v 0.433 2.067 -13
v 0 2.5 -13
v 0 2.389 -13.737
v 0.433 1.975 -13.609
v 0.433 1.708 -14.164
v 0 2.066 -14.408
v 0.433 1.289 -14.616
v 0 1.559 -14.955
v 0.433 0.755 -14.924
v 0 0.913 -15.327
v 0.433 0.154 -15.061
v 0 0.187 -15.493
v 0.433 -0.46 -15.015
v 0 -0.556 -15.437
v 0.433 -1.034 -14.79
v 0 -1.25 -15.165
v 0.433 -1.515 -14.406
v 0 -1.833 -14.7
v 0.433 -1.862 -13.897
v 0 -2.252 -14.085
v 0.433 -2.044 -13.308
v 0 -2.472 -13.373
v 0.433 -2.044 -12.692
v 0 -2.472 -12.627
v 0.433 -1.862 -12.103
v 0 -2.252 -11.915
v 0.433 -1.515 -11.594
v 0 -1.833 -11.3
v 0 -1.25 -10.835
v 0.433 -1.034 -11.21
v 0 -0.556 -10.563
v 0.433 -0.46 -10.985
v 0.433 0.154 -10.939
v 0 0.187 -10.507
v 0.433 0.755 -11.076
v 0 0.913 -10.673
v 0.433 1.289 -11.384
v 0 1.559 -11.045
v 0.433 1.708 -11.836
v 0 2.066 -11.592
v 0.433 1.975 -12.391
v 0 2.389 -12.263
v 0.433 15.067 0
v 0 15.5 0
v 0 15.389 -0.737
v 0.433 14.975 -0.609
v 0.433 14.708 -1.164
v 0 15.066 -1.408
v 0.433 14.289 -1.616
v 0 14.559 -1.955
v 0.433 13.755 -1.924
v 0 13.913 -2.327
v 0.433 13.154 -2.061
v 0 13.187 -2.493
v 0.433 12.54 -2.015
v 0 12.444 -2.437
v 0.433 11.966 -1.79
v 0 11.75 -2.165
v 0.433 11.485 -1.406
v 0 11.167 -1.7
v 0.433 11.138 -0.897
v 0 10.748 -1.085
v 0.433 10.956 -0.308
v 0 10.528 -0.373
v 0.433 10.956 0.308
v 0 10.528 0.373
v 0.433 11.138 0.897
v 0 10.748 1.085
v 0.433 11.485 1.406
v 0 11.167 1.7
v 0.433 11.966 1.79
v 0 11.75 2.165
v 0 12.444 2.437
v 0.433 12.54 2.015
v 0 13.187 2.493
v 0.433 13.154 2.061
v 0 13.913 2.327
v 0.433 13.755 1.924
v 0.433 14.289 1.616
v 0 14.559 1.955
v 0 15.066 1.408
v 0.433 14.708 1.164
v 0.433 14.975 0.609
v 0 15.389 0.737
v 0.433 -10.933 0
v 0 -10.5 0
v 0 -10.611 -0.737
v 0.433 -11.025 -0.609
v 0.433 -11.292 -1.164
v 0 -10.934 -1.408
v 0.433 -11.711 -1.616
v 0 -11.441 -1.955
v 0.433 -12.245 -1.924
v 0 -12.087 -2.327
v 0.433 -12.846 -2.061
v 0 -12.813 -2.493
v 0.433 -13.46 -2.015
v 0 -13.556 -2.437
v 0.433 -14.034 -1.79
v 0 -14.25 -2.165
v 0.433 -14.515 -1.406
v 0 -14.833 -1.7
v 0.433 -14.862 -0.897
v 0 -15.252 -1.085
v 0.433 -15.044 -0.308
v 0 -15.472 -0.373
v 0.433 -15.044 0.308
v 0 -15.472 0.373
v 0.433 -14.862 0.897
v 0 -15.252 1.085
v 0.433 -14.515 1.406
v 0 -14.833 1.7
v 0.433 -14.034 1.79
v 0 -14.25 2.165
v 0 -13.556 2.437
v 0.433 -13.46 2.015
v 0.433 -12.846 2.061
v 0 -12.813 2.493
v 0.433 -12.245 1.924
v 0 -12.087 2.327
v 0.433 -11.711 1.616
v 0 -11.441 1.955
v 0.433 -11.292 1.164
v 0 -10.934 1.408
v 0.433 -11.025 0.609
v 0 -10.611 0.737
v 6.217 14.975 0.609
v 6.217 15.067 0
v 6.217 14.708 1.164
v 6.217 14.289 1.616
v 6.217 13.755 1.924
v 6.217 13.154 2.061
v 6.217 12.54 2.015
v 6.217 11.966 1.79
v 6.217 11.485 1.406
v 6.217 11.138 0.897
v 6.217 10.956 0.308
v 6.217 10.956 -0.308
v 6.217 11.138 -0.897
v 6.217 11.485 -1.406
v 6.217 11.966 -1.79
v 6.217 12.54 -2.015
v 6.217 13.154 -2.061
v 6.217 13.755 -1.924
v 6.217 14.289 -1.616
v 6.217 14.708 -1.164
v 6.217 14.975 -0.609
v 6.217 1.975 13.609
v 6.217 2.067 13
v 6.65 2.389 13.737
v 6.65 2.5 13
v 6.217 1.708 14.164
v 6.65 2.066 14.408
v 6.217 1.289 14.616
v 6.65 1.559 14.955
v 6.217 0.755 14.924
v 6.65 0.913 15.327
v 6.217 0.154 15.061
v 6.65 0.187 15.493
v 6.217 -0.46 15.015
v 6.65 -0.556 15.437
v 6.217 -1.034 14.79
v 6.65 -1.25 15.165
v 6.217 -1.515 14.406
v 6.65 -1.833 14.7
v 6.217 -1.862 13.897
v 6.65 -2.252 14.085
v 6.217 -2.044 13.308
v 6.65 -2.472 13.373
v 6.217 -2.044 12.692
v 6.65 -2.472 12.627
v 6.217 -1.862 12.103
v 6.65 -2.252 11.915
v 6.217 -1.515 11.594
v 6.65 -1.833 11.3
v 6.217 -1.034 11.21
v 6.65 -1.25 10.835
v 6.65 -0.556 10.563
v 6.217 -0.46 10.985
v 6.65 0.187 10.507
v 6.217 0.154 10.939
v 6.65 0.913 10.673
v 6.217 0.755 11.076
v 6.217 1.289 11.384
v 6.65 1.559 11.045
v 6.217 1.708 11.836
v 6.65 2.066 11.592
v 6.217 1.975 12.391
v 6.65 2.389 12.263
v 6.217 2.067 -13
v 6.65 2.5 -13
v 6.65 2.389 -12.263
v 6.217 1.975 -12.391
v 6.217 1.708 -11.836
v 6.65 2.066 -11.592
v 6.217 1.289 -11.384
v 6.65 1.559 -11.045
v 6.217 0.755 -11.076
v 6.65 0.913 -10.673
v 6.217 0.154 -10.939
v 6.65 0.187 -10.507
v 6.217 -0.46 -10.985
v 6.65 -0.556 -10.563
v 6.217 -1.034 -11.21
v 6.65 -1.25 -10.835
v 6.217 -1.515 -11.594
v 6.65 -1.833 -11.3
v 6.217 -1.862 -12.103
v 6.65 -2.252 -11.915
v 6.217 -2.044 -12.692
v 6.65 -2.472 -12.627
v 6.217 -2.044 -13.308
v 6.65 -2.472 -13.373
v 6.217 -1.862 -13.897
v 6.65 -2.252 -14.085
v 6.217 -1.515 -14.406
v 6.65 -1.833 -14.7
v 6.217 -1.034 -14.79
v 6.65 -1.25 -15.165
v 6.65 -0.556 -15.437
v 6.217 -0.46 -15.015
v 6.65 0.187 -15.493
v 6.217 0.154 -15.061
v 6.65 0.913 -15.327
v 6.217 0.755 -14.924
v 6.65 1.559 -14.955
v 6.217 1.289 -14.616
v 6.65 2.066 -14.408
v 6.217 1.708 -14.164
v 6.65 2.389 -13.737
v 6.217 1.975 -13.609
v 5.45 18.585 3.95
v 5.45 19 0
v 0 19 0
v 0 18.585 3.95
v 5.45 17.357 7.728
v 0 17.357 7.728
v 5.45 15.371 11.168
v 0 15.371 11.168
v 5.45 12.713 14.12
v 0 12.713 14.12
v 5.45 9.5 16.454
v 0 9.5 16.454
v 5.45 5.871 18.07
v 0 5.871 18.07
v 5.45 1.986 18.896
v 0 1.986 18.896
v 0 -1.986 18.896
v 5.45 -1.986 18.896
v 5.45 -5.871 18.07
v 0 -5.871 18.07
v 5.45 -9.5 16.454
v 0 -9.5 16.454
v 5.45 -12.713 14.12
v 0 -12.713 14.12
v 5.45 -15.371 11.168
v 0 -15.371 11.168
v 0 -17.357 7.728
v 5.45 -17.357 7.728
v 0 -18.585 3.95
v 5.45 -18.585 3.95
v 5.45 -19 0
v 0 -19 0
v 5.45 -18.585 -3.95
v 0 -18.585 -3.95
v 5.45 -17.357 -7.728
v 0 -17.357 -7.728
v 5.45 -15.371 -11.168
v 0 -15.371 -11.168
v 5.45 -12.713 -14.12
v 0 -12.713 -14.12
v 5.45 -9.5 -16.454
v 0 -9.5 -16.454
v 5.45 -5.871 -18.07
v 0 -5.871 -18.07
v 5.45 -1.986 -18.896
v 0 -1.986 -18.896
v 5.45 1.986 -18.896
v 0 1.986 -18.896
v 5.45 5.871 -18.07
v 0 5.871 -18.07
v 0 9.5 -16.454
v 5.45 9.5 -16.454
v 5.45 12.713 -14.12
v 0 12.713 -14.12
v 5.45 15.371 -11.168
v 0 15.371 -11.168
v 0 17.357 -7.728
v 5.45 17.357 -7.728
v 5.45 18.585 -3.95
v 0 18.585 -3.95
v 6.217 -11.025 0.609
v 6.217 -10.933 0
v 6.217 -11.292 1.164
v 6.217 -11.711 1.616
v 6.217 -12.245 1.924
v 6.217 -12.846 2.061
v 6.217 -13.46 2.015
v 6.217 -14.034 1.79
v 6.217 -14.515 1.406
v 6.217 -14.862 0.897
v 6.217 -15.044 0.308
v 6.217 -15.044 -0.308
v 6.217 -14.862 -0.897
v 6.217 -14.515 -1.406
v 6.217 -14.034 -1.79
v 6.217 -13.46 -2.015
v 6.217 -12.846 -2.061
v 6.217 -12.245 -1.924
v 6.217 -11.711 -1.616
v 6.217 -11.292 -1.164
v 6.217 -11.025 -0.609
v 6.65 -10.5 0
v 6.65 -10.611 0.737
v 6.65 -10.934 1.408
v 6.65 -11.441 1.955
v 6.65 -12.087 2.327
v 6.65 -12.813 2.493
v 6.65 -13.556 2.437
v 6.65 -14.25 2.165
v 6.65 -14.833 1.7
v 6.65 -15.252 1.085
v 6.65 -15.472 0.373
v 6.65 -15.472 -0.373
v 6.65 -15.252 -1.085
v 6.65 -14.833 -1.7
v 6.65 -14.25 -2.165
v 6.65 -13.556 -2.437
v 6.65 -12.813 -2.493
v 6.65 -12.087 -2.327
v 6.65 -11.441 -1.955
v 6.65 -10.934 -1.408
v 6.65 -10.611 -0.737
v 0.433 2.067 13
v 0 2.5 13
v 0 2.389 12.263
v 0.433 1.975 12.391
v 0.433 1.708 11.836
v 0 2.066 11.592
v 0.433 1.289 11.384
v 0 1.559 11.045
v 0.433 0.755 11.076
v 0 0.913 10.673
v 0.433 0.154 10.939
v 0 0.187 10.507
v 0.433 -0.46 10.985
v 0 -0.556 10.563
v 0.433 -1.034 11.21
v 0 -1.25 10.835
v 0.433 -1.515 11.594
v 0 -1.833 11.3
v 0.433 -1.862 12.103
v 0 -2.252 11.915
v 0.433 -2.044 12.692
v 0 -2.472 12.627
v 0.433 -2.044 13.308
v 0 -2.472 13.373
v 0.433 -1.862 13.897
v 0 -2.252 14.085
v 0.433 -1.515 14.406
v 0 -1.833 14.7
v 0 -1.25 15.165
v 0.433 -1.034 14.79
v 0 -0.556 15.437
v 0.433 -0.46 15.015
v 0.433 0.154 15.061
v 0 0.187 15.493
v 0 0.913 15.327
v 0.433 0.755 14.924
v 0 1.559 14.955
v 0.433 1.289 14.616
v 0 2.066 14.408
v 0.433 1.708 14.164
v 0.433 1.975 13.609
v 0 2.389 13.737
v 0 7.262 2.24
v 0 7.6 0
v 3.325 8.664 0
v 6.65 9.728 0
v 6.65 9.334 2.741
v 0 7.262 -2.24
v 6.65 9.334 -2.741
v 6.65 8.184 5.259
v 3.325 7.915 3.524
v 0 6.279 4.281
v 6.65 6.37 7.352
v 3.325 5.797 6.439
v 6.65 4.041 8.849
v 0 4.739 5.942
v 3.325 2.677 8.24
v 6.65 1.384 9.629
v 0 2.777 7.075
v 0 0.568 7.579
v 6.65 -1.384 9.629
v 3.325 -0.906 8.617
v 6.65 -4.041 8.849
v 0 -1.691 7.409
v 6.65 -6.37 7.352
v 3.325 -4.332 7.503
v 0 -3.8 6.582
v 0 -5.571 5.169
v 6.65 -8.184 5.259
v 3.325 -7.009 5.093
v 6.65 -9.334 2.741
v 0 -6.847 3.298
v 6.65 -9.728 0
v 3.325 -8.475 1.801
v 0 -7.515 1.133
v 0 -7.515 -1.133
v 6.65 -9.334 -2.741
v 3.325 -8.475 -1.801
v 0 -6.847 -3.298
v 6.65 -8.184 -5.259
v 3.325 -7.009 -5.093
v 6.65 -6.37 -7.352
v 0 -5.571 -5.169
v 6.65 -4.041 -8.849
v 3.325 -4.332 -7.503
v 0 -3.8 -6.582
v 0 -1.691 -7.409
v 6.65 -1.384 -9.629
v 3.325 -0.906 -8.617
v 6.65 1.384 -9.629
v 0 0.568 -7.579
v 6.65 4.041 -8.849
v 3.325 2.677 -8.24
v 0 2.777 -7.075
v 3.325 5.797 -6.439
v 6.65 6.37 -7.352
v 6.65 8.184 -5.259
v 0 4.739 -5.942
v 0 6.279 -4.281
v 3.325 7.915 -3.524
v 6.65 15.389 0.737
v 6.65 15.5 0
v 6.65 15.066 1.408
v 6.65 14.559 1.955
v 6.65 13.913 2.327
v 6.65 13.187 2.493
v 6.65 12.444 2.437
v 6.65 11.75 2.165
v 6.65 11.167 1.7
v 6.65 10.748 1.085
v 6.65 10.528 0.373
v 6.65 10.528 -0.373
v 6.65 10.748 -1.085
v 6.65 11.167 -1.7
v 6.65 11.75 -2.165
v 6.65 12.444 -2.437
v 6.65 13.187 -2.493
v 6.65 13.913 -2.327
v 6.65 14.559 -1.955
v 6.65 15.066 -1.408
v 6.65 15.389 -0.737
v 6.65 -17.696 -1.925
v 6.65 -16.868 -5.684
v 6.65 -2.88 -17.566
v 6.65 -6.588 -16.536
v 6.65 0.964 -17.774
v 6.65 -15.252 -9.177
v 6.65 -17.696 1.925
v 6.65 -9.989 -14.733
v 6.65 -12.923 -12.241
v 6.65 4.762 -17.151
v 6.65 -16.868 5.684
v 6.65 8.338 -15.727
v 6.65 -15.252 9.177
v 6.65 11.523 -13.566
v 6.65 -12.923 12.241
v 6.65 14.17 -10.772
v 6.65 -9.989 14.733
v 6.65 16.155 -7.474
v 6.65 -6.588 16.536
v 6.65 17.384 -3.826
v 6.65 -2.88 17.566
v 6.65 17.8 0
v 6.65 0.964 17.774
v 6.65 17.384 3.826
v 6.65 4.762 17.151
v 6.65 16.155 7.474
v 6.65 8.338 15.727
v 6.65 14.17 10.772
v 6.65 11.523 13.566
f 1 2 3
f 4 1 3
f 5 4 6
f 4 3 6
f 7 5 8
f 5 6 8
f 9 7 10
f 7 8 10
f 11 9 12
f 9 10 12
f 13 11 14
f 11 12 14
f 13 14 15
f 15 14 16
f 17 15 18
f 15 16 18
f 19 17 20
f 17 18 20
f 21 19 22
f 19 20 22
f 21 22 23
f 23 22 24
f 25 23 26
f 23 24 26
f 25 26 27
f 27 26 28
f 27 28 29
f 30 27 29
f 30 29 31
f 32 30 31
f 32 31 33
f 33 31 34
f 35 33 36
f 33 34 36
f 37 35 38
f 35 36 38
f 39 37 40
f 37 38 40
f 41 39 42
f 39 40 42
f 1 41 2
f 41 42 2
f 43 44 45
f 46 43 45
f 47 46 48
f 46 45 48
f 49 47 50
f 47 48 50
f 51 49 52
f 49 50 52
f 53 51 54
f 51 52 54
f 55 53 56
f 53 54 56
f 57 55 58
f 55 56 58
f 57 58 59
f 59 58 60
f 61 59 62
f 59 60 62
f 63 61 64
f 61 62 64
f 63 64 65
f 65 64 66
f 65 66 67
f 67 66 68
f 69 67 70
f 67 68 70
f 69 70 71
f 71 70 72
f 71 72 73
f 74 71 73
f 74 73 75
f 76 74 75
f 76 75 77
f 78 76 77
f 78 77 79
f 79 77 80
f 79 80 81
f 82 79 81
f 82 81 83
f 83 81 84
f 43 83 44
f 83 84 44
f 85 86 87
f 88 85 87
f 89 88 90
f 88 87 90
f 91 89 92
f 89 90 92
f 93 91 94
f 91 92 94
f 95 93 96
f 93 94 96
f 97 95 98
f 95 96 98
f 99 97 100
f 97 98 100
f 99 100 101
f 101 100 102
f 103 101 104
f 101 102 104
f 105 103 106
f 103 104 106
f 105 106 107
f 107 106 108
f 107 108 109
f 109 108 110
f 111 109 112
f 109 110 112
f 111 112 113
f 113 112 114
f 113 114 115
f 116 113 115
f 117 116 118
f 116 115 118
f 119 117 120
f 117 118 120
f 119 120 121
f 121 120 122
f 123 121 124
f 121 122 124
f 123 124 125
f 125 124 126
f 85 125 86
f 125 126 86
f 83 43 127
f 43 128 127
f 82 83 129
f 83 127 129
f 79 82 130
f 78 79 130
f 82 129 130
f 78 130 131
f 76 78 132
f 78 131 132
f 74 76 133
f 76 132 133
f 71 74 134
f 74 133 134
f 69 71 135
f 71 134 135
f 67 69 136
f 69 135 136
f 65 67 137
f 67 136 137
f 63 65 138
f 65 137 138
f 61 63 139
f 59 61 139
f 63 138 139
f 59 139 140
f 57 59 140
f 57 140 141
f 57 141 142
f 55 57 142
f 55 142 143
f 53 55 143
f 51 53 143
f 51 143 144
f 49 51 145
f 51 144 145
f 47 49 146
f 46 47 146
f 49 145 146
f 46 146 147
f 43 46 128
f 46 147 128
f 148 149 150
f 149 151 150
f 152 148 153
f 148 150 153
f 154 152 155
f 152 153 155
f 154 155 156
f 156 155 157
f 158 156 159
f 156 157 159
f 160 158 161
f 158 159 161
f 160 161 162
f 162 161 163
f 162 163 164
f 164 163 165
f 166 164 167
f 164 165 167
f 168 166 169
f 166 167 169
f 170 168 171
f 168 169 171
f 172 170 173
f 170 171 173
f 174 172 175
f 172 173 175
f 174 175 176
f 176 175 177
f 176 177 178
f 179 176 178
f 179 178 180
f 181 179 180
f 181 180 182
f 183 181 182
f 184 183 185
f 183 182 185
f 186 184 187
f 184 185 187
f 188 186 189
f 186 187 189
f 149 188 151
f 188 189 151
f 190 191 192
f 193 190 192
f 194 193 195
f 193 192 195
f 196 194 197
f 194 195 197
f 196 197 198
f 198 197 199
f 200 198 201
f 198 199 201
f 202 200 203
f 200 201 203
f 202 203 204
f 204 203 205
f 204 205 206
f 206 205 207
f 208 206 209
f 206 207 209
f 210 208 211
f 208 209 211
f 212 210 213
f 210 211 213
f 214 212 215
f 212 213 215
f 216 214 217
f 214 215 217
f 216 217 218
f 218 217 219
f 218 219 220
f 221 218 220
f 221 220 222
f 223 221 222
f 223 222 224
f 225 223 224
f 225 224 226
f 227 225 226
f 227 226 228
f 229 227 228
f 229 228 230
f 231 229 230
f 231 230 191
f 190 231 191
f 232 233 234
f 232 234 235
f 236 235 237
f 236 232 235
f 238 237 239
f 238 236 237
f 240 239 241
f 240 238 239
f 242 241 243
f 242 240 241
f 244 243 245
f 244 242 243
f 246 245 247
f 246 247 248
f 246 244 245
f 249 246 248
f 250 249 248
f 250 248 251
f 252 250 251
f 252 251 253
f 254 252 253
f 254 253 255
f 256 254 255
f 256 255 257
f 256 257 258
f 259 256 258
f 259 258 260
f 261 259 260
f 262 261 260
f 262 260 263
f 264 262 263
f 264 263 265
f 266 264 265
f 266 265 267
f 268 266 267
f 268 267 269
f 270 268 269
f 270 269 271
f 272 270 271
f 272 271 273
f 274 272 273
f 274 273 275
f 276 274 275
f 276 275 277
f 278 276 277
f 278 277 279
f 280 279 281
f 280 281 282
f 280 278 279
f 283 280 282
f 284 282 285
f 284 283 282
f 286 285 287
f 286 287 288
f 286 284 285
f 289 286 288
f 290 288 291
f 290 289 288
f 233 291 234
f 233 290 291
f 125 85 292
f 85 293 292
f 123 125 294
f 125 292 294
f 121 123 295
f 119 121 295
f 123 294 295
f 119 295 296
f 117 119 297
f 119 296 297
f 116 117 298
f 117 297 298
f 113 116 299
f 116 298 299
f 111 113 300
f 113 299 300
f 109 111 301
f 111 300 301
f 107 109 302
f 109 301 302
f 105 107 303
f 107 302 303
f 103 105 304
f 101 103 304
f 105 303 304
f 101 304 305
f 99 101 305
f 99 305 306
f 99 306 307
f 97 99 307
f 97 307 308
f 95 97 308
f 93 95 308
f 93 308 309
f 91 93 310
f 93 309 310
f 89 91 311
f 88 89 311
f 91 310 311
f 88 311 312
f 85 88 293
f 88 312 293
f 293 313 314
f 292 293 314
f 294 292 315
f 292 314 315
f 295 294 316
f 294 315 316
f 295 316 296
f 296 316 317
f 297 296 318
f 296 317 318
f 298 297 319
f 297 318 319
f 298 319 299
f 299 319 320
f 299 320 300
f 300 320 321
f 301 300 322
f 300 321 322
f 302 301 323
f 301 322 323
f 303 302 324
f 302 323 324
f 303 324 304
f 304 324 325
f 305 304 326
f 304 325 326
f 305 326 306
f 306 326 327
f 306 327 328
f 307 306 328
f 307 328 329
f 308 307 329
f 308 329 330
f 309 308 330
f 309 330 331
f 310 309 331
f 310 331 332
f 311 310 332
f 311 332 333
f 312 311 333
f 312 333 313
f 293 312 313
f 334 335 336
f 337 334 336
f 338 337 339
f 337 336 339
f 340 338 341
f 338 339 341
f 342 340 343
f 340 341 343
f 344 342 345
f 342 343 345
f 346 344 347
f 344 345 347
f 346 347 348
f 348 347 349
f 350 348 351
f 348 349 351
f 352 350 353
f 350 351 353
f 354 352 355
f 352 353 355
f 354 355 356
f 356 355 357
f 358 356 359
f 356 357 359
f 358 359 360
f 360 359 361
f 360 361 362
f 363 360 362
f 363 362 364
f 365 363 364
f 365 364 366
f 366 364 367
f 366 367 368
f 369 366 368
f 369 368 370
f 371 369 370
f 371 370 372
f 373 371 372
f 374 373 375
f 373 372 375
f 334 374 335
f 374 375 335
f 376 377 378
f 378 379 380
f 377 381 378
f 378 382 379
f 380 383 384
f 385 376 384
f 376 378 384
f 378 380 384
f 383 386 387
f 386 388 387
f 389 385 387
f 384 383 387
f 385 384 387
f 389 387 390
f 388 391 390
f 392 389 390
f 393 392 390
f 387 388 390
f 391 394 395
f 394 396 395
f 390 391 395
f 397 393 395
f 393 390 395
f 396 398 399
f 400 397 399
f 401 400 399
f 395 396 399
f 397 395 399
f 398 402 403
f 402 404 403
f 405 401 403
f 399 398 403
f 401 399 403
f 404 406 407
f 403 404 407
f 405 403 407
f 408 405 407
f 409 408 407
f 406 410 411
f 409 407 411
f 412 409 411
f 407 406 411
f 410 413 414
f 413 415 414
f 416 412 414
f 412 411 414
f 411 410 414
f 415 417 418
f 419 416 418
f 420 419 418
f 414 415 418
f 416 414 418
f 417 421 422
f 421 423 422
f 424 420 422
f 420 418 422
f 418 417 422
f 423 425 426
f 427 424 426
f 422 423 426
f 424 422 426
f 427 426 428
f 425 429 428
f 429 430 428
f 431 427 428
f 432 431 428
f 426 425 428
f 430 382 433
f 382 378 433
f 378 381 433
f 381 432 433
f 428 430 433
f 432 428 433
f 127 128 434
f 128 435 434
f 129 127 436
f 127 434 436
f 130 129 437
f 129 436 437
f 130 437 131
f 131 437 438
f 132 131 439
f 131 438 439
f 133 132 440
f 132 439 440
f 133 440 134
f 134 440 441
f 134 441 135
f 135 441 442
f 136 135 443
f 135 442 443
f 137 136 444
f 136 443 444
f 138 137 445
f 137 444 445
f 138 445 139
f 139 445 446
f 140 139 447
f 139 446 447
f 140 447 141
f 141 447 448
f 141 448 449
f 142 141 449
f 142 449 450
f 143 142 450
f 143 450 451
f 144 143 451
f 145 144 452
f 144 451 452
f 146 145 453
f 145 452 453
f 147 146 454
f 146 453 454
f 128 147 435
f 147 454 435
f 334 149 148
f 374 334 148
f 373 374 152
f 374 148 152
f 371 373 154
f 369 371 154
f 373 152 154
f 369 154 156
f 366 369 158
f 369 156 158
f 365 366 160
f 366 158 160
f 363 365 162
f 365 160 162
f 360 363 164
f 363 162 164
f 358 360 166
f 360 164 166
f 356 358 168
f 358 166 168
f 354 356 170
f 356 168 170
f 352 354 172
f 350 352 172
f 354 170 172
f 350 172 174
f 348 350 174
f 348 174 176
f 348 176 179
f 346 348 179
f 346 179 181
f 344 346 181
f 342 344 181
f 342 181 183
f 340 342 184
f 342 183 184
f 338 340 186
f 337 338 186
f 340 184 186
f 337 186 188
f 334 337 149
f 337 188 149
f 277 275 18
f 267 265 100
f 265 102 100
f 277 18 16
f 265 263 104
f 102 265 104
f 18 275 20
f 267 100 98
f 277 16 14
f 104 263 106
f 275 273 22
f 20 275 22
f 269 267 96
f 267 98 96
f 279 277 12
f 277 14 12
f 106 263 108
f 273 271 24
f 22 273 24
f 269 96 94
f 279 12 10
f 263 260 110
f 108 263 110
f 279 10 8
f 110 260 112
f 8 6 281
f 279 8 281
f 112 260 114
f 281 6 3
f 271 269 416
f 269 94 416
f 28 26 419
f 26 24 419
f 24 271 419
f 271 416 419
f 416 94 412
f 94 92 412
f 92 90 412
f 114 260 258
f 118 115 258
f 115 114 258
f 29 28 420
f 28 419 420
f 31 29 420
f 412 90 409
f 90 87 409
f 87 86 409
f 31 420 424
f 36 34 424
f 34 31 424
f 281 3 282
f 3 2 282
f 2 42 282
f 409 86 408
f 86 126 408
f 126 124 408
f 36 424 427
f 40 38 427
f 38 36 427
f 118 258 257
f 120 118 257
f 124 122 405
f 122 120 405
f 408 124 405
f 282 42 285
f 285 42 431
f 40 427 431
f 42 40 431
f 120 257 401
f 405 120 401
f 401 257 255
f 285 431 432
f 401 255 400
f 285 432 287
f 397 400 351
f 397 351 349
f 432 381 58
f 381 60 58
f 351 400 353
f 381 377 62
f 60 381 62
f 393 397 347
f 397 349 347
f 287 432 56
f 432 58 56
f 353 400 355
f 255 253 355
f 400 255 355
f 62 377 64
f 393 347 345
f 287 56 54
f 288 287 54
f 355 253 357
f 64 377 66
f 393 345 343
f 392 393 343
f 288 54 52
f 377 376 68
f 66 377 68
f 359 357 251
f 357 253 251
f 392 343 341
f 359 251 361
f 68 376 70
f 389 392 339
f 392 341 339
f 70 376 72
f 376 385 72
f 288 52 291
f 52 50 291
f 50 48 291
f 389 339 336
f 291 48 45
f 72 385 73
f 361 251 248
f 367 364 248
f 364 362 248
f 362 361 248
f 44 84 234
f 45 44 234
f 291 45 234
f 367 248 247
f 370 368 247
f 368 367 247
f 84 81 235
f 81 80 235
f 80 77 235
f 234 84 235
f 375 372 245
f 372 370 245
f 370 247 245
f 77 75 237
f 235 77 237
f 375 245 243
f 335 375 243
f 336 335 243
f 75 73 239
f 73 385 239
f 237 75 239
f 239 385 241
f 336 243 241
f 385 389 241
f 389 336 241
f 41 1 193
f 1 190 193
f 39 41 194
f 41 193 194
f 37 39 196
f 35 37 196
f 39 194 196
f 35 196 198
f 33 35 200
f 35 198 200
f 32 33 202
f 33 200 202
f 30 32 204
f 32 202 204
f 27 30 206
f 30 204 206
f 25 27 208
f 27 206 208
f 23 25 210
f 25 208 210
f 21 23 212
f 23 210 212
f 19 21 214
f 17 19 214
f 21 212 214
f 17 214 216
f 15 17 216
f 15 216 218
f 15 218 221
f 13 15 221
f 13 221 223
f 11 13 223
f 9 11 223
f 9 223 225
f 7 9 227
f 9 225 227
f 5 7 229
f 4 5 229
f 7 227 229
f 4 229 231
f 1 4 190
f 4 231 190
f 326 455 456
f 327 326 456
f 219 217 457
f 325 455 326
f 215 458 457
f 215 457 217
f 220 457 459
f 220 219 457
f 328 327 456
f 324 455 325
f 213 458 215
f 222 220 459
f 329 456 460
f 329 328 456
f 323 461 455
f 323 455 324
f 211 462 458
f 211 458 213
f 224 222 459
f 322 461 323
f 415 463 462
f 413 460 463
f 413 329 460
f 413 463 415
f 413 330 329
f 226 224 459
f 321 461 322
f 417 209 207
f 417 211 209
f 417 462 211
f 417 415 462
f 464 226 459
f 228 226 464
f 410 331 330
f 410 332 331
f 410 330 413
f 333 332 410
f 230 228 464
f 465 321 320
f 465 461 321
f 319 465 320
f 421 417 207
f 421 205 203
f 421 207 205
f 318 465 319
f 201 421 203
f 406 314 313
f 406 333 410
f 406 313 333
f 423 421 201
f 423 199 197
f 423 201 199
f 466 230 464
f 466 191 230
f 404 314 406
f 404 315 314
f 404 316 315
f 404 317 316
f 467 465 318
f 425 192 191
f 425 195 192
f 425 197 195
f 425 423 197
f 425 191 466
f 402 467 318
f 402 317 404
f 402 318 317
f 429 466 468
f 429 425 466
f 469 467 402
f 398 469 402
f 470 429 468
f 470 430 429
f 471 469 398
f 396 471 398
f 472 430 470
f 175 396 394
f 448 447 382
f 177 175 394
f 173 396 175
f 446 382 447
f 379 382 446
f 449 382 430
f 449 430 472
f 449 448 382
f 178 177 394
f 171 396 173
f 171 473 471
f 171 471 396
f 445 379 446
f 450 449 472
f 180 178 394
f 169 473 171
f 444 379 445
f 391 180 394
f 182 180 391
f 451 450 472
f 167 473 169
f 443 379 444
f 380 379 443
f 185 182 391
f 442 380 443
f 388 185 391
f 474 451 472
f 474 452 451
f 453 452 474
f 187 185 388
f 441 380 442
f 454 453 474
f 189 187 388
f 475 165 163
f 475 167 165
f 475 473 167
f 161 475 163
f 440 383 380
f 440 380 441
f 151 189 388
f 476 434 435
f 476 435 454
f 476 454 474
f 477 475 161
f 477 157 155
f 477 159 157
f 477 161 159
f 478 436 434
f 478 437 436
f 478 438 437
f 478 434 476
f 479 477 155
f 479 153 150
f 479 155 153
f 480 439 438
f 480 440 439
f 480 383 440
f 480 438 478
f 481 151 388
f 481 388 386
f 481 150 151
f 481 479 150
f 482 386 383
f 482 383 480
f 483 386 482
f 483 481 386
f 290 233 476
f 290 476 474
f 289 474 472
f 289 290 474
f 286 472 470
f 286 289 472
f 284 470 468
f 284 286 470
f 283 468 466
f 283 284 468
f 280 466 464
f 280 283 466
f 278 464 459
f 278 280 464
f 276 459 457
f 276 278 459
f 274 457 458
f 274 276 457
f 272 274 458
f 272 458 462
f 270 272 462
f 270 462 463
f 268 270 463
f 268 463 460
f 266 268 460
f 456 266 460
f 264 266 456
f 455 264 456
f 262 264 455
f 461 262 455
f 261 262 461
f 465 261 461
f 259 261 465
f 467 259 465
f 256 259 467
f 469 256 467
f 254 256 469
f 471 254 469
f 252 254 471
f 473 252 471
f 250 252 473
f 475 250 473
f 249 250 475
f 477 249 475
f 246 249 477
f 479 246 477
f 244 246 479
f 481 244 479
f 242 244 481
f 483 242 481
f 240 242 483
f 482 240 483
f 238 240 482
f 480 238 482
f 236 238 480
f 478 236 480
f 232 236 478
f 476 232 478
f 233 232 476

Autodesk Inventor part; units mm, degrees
sketch "Sketch_10" plane through (0, 0, 0) normal (0, 0, 1) x (1, 0, 0)
  line L0 (6.65, 0) -> (0, 0)
  line L1 (0, 0) -> (0, 19)
  line L2 (0, 19) -> (5.45, 19)
  line L3 (5.45, 19) -> (6.65, 17.8)
  line L4 (6.65, 17.8) -> (6.65, 0)
  line L5 (6.65, 0) -> (0, 0)
revolve "Revolution1" add sketch "Sketch_10" angle 360 about axis through (6.65, 0, 0) along (1, 0, 0)
sketch "Sketch_11" plane through (0, 0, 0) normal (0, 0, 1) x (1, 0, 0)
  line L0 (6.65, 0) -> (0, 0)
  line L1 (0, 0) -> (0, 7.6)
  line L2 (0, 7.6) -> (6.65, 9.728)
  line L3 (6.65, 9.728) -> (6.65, 0)
  line L4 (6.65, 0) -> (0, 0)
revolve "Revolution2" cut sketch "Sketch_11" angle 360 about axis through (6.65, 0, 0) along (1, 0, 0)
sketch "Sketch_12" plane through (0, 0, 0) normal (0, 0, 1) x (1, 0, 0)
  line L0 (6.65, 13) -> (0, 13)
  line L1 (0, 13) -> (0, 15.5)
  line L2 (0, 15.5) -> (0.433, 15.067)
  line L3 (0.433, 15.067) -> (6.217, 15.067)
  line L4 (6.217, 15.067) -> (6.65, 15.5)
  line L5 (6.65, 15.5) -> (6.65, 13)
  line L6 (6.65, 13) -> (0, 13)
revolve "Revolution3" cut sketch "Sketch_12" angle 360 about axis through (6.65, 13, 0) along (1, 0, 0)
thread "Thread1" size "M5x0.8" class "6H" standard "ISO Metric profile" full length
pattern_linear "Rectangular Pattern1" count 2 spacing 18.3848 along (0, -0.7071, 0.7071) count 2 spacing 18.3848 along (0, -0.7071, -0.7071) of "Revolution3"
ref_plane "at1_dgb_st_XY" through (0, 0, 0) normal (1, 0, 0) x (0, 0, -1)
ref_plane "at1_dgb_st_YZ" through (0, 0, 0) normal (0, 0, -1) x (0, 1, 0)
ref_plane "at1_dgb_st_ZX" through (0, 0, 0) normal (0, 1, 0) x (1, 0, 0)
ref_plane "at_gew_XY" through (15, 0, 0) normal (1, 0, 0) x (0, 0, -1)
ref_plane "at_gew_YZ" through (15, 0, 0) normal (0, 0, -1) x (0, 1, 0)
ref_plane "at_gew_ZX" through (15, 0, 0) normal (0, 1, 0) x (1, 0, 0)
ref_plane "it_schrschei_XY" through (7.5, 0, 0) normal (1, 0, 0) x (0, 0, -1)
ref_plane "it_schrschei_YZ" through (7.5, 0, 0) normal (0, 0, -1) x (0, 1, 0)
ref_plane "it_schrschei_ZX" through (7.5, 0, 0) normal (0, 1, 0) x (1, 0, 0)
properties part number "61581400_2"
